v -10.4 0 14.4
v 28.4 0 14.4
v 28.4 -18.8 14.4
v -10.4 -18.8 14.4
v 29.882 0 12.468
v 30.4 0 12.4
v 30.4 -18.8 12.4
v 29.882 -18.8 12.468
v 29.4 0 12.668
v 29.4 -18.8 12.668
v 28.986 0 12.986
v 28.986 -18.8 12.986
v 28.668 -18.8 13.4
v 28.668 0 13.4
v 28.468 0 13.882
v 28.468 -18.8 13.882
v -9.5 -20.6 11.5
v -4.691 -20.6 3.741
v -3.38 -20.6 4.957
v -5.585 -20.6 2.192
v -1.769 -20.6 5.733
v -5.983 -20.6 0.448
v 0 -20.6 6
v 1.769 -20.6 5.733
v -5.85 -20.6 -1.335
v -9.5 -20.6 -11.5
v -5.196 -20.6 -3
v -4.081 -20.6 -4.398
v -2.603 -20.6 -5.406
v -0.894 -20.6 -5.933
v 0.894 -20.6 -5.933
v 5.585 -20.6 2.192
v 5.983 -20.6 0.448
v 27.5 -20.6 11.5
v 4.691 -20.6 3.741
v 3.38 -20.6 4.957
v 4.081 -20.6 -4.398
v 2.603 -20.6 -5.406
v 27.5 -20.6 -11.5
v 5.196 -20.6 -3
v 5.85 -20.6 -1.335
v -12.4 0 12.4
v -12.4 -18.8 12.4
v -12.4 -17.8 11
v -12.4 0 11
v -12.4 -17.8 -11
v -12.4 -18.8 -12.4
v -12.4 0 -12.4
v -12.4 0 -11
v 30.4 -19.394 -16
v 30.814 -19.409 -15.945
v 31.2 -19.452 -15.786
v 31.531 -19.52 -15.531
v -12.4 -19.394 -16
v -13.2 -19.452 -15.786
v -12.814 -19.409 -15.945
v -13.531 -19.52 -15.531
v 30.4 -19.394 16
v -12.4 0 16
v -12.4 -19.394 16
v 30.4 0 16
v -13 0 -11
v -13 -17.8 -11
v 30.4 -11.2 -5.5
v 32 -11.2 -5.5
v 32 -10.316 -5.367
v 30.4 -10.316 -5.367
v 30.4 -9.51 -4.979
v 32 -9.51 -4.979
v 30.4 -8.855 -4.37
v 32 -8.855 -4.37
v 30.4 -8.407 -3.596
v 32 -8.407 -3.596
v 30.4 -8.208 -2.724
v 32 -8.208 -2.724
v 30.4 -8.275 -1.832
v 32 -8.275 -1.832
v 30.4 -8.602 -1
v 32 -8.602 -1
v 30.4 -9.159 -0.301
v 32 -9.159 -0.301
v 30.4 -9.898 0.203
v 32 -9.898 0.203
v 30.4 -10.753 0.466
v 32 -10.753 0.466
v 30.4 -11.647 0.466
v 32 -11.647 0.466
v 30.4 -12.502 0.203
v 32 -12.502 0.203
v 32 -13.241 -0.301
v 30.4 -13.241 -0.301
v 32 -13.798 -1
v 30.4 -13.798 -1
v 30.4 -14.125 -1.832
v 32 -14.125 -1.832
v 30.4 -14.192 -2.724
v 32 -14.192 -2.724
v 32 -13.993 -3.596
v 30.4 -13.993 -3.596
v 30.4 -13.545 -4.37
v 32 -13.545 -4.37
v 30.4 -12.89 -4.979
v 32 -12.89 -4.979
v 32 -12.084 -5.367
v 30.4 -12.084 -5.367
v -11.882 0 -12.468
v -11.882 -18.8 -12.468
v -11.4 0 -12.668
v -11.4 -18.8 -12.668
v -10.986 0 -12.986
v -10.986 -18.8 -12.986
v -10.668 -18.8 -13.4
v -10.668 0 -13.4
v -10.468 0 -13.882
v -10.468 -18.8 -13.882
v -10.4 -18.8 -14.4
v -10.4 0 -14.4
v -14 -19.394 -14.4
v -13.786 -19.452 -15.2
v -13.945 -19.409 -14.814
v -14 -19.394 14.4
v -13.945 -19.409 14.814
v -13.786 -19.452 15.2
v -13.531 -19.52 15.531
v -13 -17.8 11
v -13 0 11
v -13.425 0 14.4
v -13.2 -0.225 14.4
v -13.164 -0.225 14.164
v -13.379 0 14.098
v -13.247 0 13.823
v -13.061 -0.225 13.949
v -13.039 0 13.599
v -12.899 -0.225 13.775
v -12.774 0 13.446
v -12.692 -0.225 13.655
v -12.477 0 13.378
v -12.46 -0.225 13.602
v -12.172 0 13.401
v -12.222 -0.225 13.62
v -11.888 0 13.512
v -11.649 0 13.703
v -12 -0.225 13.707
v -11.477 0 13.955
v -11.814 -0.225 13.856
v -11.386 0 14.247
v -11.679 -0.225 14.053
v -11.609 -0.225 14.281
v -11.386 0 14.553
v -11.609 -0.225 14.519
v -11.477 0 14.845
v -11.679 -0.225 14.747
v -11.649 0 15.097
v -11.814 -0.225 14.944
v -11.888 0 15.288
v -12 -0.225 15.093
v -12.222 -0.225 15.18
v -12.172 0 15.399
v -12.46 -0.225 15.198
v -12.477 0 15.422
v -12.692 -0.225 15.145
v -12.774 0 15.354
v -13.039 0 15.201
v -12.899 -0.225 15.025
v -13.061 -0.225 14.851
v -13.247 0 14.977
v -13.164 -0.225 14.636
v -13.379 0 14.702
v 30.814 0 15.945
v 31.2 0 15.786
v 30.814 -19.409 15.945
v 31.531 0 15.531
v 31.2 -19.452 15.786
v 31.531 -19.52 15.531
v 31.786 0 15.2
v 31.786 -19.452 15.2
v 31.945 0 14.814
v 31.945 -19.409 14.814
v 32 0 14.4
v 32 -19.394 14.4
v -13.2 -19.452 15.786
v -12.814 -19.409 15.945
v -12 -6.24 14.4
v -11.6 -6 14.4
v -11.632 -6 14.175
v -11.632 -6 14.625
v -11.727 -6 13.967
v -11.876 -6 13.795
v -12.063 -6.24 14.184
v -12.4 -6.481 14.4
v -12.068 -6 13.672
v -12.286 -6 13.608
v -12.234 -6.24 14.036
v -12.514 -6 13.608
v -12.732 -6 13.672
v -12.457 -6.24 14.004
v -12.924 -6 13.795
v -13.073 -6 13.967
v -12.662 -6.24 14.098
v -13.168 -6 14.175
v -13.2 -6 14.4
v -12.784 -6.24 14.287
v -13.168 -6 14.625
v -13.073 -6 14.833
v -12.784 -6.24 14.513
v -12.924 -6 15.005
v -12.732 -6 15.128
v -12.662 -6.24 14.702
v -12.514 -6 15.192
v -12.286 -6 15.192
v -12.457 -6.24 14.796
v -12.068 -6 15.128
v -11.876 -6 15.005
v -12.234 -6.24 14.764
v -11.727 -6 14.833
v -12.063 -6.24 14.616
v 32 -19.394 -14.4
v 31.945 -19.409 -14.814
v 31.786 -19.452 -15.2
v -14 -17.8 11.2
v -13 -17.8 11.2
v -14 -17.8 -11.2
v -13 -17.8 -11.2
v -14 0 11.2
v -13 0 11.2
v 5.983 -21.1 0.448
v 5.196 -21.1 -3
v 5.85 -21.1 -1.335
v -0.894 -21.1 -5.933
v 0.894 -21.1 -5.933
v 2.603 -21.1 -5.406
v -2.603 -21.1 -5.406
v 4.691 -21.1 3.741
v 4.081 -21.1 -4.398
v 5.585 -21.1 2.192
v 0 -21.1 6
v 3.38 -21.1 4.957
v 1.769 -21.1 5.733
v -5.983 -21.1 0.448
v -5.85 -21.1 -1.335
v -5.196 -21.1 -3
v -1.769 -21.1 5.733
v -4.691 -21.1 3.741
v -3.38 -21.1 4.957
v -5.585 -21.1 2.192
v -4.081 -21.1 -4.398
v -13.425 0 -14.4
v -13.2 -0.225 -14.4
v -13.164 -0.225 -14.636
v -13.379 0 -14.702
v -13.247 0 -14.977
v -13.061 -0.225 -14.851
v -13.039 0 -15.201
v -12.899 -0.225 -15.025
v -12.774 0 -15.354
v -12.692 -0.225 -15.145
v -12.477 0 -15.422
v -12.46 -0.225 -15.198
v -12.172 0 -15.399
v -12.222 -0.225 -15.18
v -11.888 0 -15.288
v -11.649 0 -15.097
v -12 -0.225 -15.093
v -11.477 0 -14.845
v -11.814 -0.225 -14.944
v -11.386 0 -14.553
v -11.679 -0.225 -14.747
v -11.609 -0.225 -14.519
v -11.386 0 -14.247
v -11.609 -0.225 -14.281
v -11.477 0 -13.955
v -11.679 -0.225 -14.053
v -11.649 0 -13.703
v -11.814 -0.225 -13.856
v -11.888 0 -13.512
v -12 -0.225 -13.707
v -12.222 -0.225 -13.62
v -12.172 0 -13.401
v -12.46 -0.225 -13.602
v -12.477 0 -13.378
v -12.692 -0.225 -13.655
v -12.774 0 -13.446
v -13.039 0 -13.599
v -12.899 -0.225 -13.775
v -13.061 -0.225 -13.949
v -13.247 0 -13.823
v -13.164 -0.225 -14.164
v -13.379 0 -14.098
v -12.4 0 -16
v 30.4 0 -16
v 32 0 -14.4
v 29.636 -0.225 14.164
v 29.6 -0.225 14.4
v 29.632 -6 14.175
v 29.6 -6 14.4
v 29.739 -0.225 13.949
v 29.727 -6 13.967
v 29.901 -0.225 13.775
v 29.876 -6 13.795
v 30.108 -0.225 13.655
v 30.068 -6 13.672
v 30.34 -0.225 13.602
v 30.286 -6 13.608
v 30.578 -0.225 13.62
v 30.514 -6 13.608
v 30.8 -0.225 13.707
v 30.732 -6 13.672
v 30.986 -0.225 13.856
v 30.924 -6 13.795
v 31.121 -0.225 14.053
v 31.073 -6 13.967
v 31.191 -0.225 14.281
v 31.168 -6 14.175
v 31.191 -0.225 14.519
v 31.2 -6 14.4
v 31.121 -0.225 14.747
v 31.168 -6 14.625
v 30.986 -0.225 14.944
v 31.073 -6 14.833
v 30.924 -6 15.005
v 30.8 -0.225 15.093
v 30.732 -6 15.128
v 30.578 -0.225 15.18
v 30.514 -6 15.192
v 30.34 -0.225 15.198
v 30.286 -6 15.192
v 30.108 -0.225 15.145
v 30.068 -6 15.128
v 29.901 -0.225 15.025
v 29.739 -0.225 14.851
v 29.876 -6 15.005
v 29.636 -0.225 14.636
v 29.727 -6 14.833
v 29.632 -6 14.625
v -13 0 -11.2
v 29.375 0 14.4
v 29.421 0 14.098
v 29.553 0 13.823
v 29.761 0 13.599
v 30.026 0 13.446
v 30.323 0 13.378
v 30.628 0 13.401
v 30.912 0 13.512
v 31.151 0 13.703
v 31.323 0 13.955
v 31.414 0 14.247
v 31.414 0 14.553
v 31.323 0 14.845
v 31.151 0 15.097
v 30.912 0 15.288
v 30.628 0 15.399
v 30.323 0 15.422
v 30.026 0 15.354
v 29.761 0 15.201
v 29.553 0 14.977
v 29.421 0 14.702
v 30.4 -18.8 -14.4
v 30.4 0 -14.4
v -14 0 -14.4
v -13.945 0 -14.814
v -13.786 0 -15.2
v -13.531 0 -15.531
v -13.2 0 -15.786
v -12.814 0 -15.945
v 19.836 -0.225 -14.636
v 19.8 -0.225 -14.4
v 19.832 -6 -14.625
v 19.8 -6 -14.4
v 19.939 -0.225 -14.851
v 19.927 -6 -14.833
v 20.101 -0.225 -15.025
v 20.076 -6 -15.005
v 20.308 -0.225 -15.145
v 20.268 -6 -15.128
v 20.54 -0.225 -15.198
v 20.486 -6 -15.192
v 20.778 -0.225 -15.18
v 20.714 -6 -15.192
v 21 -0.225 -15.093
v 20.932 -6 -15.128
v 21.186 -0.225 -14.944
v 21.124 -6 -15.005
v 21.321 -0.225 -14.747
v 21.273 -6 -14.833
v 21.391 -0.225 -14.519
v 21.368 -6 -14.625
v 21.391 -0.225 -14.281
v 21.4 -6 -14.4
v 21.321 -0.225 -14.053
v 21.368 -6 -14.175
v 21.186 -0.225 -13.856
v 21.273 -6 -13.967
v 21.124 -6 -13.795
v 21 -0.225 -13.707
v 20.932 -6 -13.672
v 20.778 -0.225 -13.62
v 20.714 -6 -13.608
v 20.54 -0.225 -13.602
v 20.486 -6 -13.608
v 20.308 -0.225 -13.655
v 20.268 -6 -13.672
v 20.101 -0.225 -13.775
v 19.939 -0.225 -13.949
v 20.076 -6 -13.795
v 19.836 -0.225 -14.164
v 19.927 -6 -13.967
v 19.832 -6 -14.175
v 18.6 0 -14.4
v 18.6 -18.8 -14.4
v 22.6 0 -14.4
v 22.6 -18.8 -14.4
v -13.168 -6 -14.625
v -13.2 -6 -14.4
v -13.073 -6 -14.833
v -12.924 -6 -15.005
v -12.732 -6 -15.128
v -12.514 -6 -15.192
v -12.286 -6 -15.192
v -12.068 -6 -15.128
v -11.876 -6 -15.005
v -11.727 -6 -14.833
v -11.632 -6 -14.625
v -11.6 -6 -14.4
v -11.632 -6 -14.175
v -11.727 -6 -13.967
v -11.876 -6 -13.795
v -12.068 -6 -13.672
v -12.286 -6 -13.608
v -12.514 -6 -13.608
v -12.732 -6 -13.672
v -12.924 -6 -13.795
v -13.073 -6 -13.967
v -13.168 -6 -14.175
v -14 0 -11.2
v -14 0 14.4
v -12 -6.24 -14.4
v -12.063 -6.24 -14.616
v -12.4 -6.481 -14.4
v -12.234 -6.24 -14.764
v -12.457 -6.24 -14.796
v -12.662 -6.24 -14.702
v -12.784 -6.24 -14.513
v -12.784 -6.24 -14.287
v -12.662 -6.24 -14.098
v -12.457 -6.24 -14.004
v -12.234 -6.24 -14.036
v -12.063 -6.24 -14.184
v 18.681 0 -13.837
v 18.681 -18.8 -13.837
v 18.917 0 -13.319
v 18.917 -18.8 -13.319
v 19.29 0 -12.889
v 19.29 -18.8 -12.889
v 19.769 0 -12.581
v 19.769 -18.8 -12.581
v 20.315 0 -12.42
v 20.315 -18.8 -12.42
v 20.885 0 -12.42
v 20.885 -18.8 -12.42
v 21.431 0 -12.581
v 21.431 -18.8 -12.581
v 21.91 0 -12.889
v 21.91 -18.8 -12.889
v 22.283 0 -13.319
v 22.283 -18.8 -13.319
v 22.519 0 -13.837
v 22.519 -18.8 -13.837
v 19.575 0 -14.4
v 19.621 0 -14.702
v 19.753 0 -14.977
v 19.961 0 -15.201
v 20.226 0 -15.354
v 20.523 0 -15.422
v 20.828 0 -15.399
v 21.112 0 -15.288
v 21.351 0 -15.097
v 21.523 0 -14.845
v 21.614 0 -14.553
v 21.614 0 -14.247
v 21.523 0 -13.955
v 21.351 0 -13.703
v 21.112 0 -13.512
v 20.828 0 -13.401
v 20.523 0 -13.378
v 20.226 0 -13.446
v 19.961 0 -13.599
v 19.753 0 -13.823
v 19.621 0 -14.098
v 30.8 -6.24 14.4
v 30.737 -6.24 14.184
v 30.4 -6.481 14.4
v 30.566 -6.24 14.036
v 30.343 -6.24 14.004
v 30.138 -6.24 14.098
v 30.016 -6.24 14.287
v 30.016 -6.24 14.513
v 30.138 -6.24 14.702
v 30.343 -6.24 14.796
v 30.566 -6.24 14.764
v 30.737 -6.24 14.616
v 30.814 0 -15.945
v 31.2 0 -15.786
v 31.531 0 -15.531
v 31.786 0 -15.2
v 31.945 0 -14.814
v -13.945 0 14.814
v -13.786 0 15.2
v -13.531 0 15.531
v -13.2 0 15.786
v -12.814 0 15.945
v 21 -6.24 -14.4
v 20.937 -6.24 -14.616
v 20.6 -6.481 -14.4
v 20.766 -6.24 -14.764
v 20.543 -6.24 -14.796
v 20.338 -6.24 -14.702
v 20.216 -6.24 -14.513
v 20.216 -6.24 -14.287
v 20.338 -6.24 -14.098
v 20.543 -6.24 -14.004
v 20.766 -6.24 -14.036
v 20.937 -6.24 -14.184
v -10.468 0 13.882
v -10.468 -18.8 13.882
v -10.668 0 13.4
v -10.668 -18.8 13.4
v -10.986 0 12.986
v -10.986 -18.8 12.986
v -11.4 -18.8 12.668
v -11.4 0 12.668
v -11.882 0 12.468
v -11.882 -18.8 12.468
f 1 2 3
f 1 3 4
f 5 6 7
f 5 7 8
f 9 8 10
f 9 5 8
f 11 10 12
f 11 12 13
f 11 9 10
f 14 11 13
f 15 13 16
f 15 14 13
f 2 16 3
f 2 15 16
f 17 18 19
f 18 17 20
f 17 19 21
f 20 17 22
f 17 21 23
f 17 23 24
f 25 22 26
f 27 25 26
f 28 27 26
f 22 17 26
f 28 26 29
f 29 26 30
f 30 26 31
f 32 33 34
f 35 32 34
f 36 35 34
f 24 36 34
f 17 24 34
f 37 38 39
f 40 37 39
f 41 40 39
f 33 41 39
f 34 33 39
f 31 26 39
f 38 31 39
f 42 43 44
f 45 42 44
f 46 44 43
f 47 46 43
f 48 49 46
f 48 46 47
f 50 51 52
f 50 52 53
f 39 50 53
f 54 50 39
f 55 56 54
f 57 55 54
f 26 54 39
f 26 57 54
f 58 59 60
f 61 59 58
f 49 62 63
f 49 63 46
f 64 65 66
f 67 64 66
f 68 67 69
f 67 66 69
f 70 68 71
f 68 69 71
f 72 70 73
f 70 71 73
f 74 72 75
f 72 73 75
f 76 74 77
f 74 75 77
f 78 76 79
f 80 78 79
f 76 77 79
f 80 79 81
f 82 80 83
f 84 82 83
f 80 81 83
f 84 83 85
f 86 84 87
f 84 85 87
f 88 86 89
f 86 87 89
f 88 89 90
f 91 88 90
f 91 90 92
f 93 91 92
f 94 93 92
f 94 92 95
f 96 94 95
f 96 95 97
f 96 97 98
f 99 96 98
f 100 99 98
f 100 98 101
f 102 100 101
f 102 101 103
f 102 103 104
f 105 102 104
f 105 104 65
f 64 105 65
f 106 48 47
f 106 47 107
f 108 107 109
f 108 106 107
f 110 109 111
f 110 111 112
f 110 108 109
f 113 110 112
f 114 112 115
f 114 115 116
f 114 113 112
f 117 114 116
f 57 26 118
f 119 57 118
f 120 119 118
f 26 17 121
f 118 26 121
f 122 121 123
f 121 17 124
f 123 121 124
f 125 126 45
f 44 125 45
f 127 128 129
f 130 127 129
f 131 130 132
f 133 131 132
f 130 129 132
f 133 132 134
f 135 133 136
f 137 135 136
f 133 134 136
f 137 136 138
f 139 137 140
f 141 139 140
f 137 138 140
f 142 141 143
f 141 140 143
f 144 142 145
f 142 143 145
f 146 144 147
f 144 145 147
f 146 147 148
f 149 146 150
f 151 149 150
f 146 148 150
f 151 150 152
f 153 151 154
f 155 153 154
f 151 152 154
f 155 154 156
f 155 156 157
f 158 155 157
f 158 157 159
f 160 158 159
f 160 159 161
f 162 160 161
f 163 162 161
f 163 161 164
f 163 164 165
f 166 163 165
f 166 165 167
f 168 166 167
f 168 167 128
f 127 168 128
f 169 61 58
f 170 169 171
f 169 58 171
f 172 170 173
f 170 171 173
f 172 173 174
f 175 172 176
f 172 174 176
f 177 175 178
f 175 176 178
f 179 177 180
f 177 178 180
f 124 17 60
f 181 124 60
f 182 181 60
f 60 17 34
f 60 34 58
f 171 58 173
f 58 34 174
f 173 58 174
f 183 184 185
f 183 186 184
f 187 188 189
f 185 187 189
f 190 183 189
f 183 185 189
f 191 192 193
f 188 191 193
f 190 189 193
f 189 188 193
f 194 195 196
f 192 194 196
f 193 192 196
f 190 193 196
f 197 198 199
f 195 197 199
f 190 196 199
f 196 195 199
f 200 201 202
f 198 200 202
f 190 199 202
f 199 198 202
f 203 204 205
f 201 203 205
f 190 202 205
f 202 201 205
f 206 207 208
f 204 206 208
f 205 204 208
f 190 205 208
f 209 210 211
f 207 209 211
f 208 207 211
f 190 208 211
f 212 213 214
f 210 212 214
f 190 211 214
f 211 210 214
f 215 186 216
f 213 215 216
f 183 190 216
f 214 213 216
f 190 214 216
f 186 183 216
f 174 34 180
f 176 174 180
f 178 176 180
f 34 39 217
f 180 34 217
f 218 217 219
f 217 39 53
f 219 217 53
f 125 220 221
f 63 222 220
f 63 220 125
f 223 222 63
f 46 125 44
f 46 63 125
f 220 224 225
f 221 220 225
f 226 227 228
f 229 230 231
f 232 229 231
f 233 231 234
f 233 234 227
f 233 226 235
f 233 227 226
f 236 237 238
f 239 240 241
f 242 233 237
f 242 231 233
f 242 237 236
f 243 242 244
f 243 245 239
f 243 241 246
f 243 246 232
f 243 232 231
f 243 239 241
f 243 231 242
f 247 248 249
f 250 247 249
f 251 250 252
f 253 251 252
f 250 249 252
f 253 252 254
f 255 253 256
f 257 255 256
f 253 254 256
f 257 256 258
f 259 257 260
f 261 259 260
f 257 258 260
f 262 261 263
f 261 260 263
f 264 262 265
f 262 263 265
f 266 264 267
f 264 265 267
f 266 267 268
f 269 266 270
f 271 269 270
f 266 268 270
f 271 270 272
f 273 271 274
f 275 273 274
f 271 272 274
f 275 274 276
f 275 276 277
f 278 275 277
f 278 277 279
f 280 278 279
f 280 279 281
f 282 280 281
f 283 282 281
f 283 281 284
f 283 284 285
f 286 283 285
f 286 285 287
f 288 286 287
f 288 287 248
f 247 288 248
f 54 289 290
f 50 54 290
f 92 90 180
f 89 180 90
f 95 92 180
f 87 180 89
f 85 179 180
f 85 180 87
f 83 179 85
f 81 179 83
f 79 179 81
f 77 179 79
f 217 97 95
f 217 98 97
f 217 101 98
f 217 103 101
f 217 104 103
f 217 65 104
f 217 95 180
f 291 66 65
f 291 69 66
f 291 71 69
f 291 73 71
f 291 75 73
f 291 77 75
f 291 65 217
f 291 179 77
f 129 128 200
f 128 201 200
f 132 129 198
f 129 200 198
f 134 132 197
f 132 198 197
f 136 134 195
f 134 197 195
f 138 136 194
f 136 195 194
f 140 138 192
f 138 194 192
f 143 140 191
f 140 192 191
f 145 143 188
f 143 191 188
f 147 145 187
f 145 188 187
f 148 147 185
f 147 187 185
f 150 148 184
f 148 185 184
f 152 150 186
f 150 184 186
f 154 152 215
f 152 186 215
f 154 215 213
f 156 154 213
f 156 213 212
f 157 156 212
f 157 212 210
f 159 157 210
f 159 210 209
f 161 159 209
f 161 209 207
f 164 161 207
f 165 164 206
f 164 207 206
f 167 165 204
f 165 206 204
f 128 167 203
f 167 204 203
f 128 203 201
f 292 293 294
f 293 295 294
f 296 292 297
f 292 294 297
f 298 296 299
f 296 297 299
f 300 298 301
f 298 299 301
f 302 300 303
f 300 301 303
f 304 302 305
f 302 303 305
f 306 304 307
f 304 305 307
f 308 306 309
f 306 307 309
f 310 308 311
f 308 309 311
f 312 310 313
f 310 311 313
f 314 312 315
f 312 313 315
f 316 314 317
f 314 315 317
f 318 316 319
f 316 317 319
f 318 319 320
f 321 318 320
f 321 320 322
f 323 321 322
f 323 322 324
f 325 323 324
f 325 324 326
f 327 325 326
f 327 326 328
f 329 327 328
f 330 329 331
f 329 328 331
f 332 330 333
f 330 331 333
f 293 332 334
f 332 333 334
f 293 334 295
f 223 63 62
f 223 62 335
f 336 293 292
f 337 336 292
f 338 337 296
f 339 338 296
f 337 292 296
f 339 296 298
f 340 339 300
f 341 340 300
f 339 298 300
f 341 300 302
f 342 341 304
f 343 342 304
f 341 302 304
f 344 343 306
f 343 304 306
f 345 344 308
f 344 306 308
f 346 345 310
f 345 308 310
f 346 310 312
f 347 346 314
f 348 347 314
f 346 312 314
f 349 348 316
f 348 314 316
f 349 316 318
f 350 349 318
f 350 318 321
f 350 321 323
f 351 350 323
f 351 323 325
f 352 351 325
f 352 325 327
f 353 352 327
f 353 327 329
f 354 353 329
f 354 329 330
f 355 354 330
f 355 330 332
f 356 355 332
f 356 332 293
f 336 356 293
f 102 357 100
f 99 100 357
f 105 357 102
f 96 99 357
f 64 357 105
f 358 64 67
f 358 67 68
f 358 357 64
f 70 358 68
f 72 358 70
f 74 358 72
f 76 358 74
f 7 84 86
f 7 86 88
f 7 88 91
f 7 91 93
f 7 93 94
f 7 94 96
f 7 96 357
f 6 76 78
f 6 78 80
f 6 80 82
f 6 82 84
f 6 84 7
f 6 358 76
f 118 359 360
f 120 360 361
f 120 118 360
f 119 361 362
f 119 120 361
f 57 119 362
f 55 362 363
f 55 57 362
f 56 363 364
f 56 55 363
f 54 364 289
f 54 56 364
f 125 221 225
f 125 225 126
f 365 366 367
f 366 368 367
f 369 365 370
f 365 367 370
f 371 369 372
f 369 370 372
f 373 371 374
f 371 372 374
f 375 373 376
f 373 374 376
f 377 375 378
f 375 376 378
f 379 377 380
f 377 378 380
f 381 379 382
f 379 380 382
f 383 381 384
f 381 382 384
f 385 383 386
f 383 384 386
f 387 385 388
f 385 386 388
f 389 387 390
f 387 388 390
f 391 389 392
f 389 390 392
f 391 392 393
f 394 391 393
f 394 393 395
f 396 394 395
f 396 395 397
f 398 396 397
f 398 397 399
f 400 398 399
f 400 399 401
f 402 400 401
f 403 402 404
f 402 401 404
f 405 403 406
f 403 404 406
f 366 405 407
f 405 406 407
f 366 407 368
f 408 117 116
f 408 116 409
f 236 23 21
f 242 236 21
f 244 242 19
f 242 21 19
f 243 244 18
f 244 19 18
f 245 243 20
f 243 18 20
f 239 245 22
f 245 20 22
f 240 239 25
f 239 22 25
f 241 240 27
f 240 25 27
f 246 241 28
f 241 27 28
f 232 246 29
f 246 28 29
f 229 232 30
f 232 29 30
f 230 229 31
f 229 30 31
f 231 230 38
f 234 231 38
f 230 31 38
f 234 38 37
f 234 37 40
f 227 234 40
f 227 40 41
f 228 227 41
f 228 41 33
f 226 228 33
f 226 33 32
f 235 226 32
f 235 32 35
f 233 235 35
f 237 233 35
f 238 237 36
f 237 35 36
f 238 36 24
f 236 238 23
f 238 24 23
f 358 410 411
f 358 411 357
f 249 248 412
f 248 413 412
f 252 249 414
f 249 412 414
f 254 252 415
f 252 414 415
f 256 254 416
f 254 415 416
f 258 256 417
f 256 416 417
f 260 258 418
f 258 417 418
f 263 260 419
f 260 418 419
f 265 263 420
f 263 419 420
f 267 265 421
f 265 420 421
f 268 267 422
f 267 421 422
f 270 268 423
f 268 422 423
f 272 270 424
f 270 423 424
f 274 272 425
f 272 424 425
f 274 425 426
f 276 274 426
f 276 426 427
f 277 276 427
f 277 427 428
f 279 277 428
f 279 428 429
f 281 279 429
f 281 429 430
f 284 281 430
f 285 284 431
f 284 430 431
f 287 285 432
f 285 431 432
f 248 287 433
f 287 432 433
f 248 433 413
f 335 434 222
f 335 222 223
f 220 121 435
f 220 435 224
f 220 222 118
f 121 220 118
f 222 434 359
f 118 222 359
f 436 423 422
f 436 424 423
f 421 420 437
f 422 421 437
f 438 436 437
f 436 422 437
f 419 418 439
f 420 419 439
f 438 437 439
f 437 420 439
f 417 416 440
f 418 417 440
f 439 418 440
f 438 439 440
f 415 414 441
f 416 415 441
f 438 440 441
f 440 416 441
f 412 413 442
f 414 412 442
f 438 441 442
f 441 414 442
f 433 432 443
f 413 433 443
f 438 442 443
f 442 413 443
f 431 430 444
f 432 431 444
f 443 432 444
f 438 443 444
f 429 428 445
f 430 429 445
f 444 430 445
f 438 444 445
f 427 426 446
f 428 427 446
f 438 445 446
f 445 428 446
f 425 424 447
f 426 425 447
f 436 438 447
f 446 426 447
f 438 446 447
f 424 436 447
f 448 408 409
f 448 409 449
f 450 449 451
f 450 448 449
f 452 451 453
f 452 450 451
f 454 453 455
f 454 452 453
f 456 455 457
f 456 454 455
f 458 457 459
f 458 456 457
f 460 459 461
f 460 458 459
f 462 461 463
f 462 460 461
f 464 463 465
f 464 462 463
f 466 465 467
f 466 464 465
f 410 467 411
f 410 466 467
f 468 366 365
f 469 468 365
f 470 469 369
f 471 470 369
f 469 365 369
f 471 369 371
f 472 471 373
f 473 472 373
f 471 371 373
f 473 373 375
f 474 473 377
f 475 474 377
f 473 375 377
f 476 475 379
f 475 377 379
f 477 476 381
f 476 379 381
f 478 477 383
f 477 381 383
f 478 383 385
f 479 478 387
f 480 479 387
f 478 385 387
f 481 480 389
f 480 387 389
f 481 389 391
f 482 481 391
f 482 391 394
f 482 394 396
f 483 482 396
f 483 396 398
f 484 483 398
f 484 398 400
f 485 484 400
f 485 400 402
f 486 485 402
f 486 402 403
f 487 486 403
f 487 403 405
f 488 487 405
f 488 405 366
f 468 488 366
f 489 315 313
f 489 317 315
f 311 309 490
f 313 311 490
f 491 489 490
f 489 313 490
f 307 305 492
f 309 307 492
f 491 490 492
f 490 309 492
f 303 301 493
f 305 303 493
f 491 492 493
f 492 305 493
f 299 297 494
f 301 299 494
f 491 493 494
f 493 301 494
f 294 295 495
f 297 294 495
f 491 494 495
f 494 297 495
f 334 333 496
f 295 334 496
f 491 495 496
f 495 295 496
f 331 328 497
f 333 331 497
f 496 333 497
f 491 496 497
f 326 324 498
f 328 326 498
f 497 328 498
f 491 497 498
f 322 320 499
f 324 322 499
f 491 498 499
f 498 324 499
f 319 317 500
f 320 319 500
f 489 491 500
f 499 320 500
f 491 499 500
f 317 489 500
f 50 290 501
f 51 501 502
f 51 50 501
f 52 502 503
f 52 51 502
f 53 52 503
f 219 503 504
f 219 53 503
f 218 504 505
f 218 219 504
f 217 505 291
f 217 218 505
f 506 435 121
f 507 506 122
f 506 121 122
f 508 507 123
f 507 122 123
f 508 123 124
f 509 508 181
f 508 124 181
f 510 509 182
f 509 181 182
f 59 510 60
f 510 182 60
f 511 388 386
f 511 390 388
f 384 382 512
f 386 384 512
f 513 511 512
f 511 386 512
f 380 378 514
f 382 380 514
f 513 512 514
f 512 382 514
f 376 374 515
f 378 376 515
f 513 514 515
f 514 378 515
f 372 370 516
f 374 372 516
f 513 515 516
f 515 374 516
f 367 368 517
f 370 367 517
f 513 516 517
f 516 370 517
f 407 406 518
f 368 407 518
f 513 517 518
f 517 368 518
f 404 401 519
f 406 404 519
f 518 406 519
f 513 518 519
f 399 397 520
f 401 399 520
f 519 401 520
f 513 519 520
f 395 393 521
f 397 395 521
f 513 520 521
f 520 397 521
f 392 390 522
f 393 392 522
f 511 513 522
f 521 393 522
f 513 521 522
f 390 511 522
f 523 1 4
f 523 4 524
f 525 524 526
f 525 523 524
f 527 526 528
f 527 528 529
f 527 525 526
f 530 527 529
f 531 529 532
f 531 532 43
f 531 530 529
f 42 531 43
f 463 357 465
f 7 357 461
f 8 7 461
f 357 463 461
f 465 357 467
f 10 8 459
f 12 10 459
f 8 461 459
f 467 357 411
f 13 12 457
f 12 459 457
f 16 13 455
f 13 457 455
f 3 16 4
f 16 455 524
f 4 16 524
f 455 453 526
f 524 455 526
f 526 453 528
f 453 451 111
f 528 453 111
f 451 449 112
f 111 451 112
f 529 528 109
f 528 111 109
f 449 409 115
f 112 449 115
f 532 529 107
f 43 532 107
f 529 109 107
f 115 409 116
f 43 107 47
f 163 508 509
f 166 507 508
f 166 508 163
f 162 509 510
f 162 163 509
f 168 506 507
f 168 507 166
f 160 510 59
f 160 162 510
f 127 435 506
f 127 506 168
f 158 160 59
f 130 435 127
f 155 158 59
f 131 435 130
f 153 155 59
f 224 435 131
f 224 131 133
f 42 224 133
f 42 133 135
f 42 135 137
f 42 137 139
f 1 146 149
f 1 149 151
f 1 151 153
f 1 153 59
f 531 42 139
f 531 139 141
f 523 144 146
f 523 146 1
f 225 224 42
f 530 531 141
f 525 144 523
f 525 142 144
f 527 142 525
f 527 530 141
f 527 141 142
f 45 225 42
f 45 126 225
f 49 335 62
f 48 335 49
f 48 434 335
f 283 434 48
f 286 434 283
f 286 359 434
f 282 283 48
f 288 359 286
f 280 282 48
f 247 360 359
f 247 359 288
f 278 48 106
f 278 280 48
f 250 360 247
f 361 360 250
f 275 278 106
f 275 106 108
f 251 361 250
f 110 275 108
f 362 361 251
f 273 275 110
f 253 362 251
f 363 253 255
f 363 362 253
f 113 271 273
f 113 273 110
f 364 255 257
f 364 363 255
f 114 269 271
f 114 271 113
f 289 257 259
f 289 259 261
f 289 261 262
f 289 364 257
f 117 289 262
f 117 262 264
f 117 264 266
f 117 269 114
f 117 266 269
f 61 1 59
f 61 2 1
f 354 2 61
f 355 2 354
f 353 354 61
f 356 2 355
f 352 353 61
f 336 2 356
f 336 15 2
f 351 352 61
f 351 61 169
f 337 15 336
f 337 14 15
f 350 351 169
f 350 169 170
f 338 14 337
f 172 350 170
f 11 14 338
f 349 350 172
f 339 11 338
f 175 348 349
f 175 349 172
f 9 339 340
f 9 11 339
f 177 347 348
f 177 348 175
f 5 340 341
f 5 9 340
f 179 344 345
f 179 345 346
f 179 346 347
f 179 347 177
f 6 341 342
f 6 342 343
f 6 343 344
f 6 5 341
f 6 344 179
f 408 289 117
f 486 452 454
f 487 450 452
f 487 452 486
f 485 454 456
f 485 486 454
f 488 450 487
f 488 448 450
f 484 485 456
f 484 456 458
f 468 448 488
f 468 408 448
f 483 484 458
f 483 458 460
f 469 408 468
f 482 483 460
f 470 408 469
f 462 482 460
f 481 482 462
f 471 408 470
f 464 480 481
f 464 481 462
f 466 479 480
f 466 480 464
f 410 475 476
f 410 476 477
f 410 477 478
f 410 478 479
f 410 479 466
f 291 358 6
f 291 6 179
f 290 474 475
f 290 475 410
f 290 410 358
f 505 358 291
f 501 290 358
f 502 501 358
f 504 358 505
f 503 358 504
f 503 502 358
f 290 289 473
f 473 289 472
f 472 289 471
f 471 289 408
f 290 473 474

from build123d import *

# Parameters (mm, degrees)
SKETCH1_W                       = 46
SKETCH1_H                       = 32
BOSS_EXTRUDE1_DEPTH             = 20.6
M2X0_4_TAPPED_HOLE1_D           = 1.6
M2X0_4_TAPPED_HOLE1_DEPTH       = 6
M2X0_4_TAPPED_HOLE1_CSINK_D     = 2.05
M2X0_4_TAPPED_HOLE1_CSINK_ANGLE = 90
M2X0_4_TAPPED_HOLE1_TIP         = 0.480688495
FILLET1_R                       = 1.6
SKETCH4_R                       = 6
BOSS_EXTRUDE2_DEPTH             = 0.5
CUT_EXTRUDE3_DEPTH              = 18.8
SKETCH6_W                       = 2
SKETCH6_H                       = 22
CUT_EXTRUDE1_DEPTH              = 17.8
SKETCH7_W                       = 1
SKETCH7_H                       = 22.4
CUT_EXTRUDE2_DEPTH              = 17.8
SKETCH9_R                       = 3
CUT_EXTRUDE4_DEPTH              = 54.077396319
CHAMFER1_SIZE                   = 4.5
CHAMFER1_SIZE_2                 = 1.205771366


with BuildPart() as part:
    # Sketch1 → Boss-Extrude1 (new body)
    with BuildSketch(Plane(origin=(0, 0, 0), x_dir=(1, 0, 0), z_dir=(0, 1, 0))):
        with Locations((9, 0)):
            Rectangle(SKETCH1_W, SKETCH1_H)
    extrude(amount=-BOSS_EXTRUDE1_DEPTH)

    # M2x0.4 Tapped Hole1
    with Locations(Plane(origin=(0, 0, 0), x_dir=(1, 0, 0), z_dir=(0, 1, 0))):
        with Locations((-12.4, 14.4), (20.6, 14.4), (30.4, -14.4), (-12.4, -14.4)):
            CounterSinkHole(M2X0_4_TAPPED_HOLE1_D / 2, M2X0_4_TAPPED_HOLE1_CSINK_D / 2, depth=M2X0_4_TAPPED_HOLE1_DEPTH, counter_sink_angle=M2X0_4_TAPPED_HOLE1_CSINK_ANGLE)
            with Locations((0, 0, -(M2X0_4_TAPPED_HOLE1_DEPTH + M2X0_4_TAPPED_HOLE1_TIP / 2))):  # 118° drill point
                Cone(0, M2X0_4_TAPPED_HOLE1_D / 2, M2X0_4_TAPPED_HOLE1_TIP, mode=Mode.SUBTRACT)

    # Fillet1
    fillet1_edges = [part.edges().sort_by_distance(p)[0] for p in [
        (-14, -10.3, -16),
        (32, -10.3, -16),
        (32, -10.3, 16),
        (-14, -10.3, 16),
    ]]
    fillet(fillet1_edges, radius=FILLET1_R)

    # Sketch4 → Boss-Extrude2 (add)
    with BuildSketch(Plane(origin=(0, -20.6, 0), x_dir=(-1, 0, 0), z_dir=(0, -1, 0))):
        with Locations(Location((0, 0, 0), (0, 0, 270))):
            Circle(SKETCH4_R)
    extrude(amount=BOSS_EXTRUDE2_DEPTH)

    # Sketch8 → Cut-Extrude3 (cut)
    with BuildSketch(Plane(origin=(0, 0, 0), x_dir=(1, 0, 0), z_dir=(0, 1, 0))):
        with BuildLine():
            Line((-10.4, 14.4), (18.6, 14.4))
            ThreePointArc((18.6, 14.4), (20.6, 12.4), (22.6, 14.4))
            Line((22.6, 14.4), (30.4, 14.4))
            Line((30.4, 14.4), (30.4, -12.4))
            ThreePointArc((30.4, -12.4), (28.985786438, -12.985786438), (28.4, -14.4))
            Line((28.4, -14.4), (-10.4, -14.4))
            ThreePointArc((-10.4, -14.4), (-10.985786438, -12.985786438), (-12.4, -12.4))
            Line((-12.4, -12.4), (-12.4, 12.4))
            ThreePointArc((-12.4, 12.4), (-10.985786438, 12.985786438), (-10.4, 14.4))
        make_face()
    extrude(amount=-CUT_EXTRUDE3_DEPTH, mode=Mode.SUBTRACT)

    # Sketch6 → Cut-Extrude1 (cut)
    with BuildSketch(Plane(origin=(0, 0, 0), x_dir=(1, 0, 0), z_dir=(0, 1, 0))):
        with Locations((-13, 0)):
            Rectangle(SKETCH6_W, SKETCH6_H)
    extrude(amount=-CUT_EXTRUDE1_DEPTH, mode=Mode.SUBTRACT)

    # Sketch7 → Cut-Extrude2 (cut)
    with BuildSketch(Plane(origin=(0, 0, 0), x_dir=(1, 0, 0), z_dir=(0, 1, 0))):
        with Locations((-13.5, 0)):
            Rectangle(SKETCH7_W, SKETCH7_H)
    extrude(amount=-CUT_EXTRUDE2_DEPTH, mode=Mode.SUBTRACT)

    # Sketch9 → Cut-Extrude4 (cut, through all)
    with BuildSketch(Plane(origin=(32, 0, 0), x_dir=(0, 0, -1), z_dir=(1, 0, 0))):
        with Locations((2.5, -11.2)):
            Circle(SKETCH9_R)
    extrude(amount=-CUT_EXTRUDE4_DEPTH, mode=Mode.SUBTRACT)

    # Chamfer1
    # the kernel refuses this chamfer: 4.5, 1.205771366 mm, written as the material it takes off along each edge
    with BuildSketch(Plane(origin=(42.085247066, -20.6, 16), x_dir=(0, -0.009967146577156305, -0.9999503267608394), z_dir=(-1, 0, 0))) as chamfer1_piece_1:
        Polygon((CHAMFER1_SIZE * 0.999950326761, -CHAMFER1_SIZE * 0.00996714657716), (-CHAMFER1_SIZE_2 * 0.00996714657666, -CHAMFER1_SIZE_2 * 0.999950326711), (0, 0), align=None)
    extrude(amount=66.170494132, mode=Mode.SUBTRACT)
    with BuildSketch(Plane(origin=(-14, -20.6, 26.085247066), x_dir=(0.9999503267608394, -0.009967146577156305, 0), z_dir=(0, 0, -1)), Plane(origin=(32, -20.6, -26.085247066), x_dir=(-0.9999503267608394, -0.009967146577156302, 0), z_dir=(0, 0, 1))) as chamfer1_piece_2:
        Polygon((CHAMFER1_SIZE * 0.999950326761, -CHAMFER1_SIZE * 0.00996714657716), (-CHAMFER1_SIZE_2 * 0.00996714657666, -CHAMFER1_SIZE_2 * 0.999950326711), (0, 0), align=None)
    extrude(amount=52.170494132, mode=Mode.SUBTRACT)
    with BuildSketch(Plane(origin=(-24.085247066, -20.6, -16), x_dir=(0, 0.9905000388259543, -0.1375124470212905), z_dir=(1, 0, 0))) as chamfer1_piece_3:
        Polygon((CHAMFER1_SIZE_2 * 0.990500038777, CHAMFER1_SIZE_2 * 0.137512447014), (-CHAMFER1_SIZE * 0.137512447021, CHAMFER1_SIZE * 0.990500038826), (0, 0), align=None)
    extrude(amount=66.170494132, mode=Mode.SUBTRACT)


solid = part.part
